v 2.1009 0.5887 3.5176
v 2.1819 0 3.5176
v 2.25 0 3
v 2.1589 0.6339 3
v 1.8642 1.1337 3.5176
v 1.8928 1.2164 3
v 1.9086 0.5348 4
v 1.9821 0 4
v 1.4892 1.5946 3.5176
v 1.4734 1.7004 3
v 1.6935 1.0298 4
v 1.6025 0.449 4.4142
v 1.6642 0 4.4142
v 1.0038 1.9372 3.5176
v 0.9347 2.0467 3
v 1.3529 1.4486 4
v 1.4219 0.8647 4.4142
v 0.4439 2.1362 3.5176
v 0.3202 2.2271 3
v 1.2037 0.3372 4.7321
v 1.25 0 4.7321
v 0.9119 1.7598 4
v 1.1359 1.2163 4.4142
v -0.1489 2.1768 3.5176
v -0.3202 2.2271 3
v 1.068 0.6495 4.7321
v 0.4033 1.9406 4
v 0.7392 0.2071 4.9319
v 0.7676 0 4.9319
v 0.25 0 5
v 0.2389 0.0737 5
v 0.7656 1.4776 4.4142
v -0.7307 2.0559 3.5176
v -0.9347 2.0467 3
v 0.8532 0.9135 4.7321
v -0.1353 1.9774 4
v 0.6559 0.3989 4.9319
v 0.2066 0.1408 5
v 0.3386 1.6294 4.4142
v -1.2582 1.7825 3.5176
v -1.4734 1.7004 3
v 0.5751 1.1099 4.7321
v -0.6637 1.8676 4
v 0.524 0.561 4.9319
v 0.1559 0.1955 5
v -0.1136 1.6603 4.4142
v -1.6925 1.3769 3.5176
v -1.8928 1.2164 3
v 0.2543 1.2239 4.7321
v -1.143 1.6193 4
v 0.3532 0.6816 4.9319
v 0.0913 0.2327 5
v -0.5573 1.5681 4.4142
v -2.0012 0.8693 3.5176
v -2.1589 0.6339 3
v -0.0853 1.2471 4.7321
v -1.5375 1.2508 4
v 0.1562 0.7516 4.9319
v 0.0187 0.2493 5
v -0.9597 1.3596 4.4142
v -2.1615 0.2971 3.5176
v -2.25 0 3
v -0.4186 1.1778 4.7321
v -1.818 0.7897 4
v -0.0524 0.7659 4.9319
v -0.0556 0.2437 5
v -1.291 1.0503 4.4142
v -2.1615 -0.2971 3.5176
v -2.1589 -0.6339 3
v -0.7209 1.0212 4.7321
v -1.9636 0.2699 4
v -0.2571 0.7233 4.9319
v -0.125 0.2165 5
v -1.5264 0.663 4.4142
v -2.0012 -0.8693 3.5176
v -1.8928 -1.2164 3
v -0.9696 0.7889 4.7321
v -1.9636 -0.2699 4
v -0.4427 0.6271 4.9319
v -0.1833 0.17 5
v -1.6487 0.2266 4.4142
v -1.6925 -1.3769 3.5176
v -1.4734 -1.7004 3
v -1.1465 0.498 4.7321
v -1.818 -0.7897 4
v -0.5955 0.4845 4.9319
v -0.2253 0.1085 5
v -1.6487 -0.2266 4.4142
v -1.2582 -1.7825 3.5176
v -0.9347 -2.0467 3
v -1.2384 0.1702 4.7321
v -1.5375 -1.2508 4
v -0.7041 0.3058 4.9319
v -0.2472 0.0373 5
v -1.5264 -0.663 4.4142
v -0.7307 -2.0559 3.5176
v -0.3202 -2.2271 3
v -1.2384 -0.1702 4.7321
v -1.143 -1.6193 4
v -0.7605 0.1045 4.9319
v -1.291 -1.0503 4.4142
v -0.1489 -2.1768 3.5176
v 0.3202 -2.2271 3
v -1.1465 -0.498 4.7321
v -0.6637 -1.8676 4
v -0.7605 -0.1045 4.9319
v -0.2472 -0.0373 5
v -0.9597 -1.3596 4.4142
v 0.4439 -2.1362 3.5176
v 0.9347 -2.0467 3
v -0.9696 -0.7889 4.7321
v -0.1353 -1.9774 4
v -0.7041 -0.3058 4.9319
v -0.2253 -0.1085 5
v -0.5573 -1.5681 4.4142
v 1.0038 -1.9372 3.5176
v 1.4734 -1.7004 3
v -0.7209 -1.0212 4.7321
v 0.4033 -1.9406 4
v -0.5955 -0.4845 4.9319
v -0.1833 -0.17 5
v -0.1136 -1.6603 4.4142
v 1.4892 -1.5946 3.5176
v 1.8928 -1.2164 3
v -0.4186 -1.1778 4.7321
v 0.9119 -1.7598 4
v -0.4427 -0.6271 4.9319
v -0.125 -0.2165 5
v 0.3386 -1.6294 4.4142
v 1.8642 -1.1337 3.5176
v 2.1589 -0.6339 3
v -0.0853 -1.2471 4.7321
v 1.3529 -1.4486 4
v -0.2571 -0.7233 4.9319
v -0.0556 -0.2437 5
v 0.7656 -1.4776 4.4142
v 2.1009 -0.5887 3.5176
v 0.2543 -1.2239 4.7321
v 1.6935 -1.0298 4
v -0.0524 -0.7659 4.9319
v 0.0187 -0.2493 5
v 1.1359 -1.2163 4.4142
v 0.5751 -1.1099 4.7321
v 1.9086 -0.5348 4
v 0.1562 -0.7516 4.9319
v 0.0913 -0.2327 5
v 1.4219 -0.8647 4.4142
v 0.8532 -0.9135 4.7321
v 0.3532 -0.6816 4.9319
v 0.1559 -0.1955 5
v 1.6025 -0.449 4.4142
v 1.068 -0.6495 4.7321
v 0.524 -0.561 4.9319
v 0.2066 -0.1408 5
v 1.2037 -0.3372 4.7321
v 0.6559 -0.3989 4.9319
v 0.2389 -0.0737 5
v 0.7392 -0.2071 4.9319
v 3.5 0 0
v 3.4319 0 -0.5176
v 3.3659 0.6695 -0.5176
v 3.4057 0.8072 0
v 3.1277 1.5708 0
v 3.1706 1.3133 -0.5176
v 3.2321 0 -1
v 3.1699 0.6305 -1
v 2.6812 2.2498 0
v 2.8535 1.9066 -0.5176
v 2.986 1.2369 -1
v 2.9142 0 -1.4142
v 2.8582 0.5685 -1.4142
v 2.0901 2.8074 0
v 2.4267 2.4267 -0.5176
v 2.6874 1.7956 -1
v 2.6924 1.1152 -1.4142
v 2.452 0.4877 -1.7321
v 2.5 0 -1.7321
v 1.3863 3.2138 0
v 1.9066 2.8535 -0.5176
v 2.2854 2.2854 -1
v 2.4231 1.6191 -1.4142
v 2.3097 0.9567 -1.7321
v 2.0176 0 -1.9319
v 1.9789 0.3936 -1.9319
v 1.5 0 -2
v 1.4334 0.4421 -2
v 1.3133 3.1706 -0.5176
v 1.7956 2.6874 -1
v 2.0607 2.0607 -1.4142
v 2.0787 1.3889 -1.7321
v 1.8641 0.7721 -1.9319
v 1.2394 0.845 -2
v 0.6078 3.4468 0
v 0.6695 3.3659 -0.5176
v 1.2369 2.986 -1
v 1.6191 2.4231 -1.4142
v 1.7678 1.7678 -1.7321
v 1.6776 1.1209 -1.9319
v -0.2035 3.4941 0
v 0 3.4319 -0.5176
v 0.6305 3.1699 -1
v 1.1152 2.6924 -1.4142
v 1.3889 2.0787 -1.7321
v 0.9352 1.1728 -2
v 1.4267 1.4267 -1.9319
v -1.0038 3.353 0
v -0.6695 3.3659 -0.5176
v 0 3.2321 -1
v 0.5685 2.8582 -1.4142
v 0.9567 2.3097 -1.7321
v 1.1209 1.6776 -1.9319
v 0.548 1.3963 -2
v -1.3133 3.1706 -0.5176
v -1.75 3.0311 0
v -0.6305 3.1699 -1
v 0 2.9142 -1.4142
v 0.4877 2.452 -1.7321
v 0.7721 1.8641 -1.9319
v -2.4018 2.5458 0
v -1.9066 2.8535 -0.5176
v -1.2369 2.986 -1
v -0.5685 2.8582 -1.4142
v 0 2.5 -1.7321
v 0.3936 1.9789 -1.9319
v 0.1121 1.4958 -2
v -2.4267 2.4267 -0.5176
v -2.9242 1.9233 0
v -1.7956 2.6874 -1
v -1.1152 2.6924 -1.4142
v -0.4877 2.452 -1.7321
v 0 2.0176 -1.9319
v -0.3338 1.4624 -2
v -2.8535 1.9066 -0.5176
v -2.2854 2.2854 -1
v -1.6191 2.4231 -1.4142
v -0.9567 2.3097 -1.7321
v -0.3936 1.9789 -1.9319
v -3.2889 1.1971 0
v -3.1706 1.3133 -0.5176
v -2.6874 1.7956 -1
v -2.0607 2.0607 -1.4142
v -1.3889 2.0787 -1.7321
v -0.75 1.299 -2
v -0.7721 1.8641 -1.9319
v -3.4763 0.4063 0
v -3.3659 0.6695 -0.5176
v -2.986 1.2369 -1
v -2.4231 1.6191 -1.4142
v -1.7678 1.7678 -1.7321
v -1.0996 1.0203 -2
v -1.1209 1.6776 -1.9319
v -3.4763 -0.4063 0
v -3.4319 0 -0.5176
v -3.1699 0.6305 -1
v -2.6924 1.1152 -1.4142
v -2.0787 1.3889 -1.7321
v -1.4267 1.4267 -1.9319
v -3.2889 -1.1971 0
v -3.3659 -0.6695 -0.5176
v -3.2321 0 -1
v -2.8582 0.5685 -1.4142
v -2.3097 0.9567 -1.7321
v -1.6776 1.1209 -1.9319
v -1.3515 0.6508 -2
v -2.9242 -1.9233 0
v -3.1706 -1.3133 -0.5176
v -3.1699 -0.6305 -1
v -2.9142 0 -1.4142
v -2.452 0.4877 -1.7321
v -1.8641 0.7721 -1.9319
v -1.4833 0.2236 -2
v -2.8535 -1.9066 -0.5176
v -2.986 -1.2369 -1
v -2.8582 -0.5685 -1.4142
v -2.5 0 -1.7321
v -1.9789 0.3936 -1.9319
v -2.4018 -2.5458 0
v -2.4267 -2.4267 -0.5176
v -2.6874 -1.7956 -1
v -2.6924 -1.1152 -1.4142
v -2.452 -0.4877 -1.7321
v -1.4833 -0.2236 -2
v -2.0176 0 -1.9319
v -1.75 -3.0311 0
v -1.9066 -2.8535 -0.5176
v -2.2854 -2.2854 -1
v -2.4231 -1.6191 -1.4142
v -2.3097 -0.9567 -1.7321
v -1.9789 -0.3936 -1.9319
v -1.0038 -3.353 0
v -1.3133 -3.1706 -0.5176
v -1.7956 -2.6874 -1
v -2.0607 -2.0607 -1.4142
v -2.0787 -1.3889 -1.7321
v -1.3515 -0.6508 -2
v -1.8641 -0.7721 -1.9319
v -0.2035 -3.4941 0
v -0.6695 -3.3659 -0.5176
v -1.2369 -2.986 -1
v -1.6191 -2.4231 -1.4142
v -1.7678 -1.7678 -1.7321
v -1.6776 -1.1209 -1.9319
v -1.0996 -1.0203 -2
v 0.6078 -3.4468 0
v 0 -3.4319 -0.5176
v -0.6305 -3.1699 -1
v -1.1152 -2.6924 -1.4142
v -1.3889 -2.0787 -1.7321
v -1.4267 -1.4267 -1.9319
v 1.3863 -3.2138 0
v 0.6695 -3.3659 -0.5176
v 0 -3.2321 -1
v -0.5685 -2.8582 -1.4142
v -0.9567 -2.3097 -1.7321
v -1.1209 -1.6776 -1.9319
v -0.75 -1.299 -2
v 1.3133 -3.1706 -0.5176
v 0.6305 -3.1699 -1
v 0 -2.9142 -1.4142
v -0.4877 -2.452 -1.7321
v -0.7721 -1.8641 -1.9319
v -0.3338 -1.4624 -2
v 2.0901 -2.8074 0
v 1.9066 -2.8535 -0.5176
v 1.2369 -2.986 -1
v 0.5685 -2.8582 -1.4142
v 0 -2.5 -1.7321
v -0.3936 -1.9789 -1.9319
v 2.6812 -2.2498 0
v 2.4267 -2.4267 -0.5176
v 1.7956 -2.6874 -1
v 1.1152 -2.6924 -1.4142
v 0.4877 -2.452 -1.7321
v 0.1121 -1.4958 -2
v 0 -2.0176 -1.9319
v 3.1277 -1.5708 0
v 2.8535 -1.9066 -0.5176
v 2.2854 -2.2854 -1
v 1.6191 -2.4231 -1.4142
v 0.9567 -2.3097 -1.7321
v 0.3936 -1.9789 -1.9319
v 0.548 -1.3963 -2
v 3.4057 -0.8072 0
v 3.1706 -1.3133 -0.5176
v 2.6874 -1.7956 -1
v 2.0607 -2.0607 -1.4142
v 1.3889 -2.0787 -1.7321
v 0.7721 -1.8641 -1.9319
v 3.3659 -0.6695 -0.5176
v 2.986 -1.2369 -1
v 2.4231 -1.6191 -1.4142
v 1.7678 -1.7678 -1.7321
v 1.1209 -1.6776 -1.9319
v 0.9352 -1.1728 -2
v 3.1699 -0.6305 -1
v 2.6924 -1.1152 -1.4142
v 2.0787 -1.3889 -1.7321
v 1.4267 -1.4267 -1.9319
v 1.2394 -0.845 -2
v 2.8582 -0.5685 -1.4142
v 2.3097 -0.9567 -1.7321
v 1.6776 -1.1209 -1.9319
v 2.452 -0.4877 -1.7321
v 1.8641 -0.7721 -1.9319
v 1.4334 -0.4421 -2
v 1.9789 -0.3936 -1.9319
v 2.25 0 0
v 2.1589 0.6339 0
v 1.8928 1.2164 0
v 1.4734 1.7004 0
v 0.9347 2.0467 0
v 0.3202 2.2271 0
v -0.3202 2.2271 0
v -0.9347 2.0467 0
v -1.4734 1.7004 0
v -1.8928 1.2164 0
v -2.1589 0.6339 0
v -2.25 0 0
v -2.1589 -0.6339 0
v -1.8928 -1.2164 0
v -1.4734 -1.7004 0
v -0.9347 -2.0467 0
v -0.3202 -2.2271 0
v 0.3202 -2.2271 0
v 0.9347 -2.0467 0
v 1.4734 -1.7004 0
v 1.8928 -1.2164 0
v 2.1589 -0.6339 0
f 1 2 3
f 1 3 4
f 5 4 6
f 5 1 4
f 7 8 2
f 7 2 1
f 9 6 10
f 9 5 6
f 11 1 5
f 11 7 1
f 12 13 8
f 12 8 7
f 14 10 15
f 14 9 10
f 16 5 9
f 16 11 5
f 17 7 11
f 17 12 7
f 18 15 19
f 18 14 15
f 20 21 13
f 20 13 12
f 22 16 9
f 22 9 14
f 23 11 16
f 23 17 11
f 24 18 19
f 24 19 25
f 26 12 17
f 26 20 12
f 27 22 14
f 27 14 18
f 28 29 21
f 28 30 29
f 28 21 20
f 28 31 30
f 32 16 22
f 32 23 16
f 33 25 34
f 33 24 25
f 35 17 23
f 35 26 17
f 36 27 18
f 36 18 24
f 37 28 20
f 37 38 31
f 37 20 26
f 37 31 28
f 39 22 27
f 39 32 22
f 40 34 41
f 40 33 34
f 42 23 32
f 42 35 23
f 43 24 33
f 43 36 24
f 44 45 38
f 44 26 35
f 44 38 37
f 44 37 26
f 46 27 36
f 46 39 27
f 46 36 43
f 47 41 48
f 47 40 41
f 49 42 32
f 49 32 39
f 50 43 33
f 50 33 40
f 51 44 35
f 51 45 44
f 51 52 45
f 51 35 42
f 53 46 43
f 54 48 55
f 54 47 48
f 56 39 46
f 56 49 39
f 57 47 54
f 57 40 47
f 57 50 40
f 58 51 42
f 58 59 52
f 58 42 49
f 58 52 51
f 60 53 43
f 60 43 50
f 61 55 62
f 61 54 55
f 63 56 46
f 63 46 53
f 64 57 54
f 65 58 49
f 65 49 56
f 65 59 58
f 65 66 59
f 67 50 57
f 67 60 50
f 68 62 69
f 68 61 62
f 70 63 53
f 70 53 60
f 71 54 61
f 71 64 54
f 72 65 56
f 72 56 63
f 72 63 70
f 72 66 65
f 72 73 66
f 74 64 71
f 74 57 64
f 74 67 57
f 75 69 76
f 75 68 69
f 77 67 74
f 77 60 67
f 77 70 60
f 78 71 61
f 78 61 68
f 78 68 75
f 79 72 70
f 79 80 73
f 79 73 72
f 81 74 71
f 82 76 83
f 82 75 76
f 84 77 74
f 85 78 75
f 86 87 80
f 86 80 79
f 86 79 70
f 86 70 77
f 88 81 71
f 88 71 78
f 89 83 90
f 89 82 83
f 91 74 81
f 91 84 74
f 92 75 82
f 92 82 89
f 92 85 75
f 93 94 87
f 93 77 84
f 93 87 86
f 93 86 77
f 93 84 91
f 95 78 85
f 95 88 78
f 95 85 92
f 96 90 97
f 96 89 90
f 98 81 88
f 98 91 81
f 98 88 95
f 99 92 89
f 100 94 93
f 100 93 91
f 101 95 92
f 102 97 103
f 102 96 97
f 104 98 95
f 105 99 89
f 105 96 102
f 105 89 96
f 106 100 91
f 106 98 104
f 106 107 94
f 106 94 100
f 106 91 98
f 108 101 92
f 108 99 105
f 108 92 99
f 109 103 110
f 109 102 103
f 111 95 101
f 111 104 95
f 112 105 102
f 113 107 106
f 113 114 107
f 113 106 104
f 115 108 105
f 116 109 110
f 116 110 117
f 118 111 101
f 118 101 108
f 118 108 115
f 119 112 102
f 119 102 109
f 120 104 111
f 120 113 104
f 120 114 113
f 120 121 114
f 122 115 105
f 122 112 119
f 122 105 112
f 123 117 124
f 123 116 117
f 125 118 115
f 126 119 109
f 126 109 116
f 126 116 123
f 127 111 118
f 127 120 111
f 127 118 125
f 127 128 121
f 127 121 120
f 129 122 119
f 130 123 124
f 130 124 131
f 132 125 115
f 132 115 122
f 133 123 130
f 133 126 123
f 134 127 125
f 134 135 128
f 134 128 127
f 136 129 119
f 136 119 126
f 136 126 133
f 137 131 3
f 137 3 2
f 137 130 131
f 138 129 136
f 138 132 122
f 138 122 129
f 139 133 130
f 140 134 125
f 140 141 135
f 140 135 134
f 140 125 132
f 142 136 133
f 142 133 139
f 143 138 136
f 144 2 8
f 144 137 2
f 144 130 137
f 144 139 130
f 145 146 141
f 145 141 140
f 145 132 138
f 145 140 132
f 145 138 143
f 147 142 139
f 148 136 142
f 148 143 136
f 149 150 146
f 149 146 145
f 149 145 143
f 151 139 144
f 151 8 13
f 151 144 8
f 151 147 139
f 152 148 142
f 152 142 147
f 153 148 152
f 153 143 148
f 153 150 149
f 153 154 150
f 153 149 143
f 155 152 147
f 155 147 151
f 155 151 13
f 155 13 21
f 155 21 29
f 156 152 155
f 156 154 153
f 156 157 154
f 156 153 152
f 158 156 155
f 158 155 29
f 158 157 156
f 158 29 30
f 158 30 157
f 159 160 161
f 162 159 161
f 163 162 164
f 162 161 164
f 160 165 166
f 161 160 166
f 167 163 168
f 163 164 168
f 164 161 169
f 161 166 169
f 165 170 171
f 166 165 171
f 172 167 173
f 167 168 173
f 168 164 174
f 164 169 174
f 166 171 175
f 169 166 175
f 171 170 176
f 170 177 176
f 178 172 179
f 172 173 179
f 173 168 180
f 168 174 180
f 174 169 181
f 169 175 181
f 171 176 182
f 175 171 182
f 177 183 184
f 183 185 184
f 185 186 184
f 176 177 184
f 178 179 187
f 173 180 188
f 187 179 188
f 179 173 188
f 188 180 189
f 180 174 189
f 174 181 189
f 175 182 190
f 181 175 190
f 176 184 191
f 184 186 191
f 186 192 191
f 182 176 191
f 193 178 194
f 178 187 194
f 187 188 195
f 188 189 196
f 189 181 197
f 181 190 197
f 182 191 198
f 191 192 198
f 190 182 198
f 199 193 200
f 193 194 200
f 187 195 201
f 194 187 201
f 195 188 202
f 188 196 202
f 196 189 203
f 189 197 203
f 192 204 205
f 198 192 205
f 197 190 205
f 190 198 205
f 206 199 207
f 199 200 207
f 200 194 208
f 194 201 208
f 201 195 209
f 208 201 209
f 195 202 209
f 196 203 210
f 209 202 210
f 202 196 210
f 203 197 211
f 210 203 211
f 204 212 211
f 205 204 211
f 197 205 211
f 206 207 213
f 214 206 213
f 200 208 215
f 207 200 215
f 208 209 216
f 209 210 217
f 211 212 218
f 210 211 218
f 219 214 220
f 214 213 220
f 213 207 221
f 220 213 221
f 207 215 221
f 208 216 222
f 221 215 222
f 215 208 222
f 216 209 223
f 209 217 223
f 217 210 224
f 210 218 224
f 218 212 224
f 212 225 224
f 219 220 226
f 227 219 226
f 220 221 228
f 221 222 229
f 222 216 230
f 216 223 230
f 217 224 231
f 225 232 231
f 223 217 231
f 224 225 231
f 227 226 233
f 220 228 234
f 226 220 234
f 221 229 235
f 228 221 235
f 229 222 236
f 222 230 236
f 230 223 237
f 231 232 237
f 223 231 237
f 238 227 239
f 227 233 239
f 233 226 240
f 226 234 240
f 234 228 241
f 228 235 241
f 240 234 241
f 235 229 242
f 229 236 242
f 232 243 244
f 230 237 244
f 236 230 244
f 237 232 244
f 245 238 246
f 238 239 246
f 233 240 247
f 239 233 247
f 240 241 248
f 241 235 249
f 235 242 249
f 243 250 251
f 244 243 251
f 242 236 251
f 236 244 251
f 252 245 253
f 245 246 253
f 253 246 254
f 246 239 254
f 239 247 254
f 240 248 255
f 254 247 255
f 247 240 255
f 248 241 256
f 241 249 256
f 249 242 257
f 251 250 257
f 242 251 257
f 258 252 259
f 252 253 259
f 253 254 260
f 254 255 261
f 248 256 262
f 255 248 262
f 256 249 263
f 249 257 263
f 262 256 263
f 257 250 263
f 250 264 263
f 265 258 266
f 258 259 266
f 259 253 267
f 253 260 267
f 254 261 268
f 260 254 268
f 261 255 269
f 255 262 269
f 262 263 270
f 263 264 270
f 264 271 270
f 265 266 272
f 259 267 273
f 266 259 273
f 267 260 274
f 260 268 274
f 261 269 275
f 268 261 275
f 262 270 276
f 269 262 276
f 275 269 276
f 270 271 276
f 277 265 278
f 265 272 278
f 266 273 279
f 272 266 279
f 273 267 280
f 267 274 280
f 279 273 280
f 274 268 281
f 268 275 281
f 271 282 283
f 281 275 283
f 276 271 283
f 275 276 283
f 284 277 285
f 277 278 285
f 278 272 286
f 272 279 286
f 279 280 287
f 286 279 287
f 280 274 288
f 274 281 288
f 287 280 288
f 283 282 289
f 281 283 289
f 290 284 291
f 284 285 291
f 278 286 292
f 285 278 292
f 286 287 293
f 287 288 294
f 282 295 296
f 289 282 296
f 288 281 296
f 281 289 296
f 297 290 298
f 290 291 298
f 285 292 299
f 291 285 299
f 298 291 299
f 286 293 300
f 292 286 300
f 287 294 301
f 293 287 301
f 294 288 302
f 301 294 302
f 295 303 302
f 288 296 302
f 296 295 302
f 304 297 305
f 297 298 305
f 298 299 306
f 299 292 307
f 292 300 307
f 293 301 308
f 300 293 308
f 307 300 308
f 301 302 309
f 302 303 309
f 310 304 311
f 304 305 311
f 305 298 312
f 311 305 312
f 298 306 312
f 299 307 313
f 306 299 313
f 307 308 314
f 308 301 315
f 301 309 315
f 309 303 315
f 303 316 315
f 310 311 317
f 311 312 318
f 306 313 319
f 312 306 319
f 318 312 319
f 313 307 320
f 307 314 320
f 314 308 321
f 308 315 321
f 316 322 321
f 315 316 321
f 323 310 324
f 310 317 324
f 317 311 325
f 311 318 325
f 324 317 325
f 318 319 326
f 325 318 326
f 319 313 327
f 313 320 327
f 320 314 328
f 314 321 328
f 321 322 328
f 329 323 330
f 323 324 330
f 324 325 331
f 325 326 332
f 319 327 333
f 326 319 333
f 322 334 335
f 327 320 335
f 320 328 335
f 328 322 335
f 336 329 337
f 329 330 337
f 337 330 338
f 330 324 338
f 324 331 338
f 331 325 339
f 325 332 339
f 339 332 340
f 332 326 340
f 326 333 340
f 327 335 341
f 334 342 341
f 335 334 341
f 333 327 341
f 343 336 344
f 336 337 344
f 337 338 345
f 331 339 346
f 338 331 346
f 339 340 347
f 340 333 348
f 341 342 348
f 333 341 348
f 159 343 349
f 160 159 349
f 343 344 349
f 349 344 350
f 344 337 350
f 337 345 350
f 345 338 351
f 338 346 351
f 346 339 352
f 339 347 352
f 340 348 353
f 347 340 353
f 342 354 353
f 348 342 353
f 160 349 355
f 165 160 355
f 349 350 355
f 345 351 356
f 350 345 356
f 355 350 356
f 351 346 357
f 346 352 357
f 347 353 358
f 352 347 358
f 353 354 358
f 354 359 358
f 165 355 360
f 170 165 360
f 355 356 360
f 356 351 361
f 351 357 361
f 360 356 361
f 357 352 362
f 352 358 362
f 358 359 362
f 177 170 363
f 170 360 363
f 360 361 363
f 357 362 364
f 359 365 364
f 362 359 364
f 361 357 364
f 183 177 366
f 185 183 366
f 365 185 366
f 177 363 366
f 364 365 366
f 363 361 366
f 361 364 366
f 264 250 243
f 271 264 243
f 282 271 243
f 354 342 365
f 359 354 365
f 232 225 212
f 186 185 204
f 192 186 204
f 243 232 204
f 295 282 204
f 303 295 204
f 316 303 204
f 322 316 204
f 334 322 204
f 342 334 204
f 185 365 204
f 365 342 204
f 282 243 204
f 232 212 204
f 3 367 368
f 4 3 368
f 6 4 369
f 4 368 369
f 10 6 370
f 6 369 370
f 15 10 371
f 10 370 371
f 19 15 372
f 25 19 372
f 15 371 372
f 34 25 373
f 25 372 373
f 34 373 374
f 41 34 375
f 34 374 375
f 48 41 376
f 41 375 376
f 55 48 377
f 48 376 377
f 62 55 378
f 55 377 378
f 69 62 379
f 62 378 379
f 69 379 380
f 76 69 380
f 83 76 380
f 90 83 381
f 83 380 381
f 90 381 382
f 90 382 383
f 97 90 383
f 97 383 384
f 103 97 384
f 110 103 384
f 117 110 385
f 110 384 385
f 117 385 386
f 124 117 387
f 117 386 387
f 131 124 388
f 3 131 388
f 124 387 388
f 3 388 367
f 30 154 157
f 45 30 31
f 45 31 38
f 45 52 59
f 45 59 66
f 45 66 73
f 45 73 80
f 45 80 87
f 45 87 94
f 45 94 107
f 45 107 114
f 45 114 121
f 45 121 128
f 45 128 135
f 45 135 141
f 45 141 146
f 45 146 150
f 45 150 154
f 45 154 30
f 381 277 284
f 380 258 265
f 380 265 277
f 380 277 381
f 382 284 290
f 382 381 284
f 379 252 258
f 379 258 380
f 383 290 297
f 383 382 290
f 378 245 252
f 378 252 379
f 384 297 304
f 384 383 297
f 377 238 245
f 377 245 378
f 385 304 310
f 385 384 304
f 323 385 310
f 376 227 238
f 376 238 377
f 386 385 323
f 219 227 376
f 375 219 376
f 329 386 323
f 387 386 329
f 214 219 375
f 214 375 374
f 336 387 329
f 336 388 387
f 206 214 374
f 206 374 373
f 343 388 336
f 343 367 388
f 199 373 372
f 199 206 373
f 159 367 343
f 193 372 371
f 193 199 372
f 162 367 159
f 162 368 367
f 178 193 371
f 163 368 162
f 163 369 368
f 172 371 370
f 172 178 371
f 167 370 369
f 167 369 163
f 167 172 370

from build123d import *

# Parameters (mm, degrees)
F0_R     = 3.5
F0_R_2   = 2.25
F1_DEPTH = 2
F2_DEPTH = 5
F3_R     = 1.99999


# Not quite as in the source:
# - a fillet or chamfer is up to 0.001 mm smaller than in the source, because OpenCascade refuses the exact size


with BuildPart() as f1:
    # F0 (on Top) → F1 (new body)
    with BuildSketch(Plane.XY):
        Circle(F0_R)
        Circle(F0_R_2, mode=Mode.SUBTRACT)
        Circle(F0_R_2)
    extrude(amount=-F1_DEPTH)

    # F0 (on Top) → F2 (join)
    with BuildSketch(Plane.XY):
        Circle(F0_R_2)
    extrude(amount=F2_DEPTH)

    # F3 (radius 2 in the source; OpenCascade refuses exactly that, so slightly less here)
    f3_edges = [f1.edges().sort_by_distance(p)[0] for p in [
        (-2.25, 0, 5),
        (-3.5, 0, -2),
    ]]
    fillet(f3_edges, radius=F3_R)


solid = f1.part
